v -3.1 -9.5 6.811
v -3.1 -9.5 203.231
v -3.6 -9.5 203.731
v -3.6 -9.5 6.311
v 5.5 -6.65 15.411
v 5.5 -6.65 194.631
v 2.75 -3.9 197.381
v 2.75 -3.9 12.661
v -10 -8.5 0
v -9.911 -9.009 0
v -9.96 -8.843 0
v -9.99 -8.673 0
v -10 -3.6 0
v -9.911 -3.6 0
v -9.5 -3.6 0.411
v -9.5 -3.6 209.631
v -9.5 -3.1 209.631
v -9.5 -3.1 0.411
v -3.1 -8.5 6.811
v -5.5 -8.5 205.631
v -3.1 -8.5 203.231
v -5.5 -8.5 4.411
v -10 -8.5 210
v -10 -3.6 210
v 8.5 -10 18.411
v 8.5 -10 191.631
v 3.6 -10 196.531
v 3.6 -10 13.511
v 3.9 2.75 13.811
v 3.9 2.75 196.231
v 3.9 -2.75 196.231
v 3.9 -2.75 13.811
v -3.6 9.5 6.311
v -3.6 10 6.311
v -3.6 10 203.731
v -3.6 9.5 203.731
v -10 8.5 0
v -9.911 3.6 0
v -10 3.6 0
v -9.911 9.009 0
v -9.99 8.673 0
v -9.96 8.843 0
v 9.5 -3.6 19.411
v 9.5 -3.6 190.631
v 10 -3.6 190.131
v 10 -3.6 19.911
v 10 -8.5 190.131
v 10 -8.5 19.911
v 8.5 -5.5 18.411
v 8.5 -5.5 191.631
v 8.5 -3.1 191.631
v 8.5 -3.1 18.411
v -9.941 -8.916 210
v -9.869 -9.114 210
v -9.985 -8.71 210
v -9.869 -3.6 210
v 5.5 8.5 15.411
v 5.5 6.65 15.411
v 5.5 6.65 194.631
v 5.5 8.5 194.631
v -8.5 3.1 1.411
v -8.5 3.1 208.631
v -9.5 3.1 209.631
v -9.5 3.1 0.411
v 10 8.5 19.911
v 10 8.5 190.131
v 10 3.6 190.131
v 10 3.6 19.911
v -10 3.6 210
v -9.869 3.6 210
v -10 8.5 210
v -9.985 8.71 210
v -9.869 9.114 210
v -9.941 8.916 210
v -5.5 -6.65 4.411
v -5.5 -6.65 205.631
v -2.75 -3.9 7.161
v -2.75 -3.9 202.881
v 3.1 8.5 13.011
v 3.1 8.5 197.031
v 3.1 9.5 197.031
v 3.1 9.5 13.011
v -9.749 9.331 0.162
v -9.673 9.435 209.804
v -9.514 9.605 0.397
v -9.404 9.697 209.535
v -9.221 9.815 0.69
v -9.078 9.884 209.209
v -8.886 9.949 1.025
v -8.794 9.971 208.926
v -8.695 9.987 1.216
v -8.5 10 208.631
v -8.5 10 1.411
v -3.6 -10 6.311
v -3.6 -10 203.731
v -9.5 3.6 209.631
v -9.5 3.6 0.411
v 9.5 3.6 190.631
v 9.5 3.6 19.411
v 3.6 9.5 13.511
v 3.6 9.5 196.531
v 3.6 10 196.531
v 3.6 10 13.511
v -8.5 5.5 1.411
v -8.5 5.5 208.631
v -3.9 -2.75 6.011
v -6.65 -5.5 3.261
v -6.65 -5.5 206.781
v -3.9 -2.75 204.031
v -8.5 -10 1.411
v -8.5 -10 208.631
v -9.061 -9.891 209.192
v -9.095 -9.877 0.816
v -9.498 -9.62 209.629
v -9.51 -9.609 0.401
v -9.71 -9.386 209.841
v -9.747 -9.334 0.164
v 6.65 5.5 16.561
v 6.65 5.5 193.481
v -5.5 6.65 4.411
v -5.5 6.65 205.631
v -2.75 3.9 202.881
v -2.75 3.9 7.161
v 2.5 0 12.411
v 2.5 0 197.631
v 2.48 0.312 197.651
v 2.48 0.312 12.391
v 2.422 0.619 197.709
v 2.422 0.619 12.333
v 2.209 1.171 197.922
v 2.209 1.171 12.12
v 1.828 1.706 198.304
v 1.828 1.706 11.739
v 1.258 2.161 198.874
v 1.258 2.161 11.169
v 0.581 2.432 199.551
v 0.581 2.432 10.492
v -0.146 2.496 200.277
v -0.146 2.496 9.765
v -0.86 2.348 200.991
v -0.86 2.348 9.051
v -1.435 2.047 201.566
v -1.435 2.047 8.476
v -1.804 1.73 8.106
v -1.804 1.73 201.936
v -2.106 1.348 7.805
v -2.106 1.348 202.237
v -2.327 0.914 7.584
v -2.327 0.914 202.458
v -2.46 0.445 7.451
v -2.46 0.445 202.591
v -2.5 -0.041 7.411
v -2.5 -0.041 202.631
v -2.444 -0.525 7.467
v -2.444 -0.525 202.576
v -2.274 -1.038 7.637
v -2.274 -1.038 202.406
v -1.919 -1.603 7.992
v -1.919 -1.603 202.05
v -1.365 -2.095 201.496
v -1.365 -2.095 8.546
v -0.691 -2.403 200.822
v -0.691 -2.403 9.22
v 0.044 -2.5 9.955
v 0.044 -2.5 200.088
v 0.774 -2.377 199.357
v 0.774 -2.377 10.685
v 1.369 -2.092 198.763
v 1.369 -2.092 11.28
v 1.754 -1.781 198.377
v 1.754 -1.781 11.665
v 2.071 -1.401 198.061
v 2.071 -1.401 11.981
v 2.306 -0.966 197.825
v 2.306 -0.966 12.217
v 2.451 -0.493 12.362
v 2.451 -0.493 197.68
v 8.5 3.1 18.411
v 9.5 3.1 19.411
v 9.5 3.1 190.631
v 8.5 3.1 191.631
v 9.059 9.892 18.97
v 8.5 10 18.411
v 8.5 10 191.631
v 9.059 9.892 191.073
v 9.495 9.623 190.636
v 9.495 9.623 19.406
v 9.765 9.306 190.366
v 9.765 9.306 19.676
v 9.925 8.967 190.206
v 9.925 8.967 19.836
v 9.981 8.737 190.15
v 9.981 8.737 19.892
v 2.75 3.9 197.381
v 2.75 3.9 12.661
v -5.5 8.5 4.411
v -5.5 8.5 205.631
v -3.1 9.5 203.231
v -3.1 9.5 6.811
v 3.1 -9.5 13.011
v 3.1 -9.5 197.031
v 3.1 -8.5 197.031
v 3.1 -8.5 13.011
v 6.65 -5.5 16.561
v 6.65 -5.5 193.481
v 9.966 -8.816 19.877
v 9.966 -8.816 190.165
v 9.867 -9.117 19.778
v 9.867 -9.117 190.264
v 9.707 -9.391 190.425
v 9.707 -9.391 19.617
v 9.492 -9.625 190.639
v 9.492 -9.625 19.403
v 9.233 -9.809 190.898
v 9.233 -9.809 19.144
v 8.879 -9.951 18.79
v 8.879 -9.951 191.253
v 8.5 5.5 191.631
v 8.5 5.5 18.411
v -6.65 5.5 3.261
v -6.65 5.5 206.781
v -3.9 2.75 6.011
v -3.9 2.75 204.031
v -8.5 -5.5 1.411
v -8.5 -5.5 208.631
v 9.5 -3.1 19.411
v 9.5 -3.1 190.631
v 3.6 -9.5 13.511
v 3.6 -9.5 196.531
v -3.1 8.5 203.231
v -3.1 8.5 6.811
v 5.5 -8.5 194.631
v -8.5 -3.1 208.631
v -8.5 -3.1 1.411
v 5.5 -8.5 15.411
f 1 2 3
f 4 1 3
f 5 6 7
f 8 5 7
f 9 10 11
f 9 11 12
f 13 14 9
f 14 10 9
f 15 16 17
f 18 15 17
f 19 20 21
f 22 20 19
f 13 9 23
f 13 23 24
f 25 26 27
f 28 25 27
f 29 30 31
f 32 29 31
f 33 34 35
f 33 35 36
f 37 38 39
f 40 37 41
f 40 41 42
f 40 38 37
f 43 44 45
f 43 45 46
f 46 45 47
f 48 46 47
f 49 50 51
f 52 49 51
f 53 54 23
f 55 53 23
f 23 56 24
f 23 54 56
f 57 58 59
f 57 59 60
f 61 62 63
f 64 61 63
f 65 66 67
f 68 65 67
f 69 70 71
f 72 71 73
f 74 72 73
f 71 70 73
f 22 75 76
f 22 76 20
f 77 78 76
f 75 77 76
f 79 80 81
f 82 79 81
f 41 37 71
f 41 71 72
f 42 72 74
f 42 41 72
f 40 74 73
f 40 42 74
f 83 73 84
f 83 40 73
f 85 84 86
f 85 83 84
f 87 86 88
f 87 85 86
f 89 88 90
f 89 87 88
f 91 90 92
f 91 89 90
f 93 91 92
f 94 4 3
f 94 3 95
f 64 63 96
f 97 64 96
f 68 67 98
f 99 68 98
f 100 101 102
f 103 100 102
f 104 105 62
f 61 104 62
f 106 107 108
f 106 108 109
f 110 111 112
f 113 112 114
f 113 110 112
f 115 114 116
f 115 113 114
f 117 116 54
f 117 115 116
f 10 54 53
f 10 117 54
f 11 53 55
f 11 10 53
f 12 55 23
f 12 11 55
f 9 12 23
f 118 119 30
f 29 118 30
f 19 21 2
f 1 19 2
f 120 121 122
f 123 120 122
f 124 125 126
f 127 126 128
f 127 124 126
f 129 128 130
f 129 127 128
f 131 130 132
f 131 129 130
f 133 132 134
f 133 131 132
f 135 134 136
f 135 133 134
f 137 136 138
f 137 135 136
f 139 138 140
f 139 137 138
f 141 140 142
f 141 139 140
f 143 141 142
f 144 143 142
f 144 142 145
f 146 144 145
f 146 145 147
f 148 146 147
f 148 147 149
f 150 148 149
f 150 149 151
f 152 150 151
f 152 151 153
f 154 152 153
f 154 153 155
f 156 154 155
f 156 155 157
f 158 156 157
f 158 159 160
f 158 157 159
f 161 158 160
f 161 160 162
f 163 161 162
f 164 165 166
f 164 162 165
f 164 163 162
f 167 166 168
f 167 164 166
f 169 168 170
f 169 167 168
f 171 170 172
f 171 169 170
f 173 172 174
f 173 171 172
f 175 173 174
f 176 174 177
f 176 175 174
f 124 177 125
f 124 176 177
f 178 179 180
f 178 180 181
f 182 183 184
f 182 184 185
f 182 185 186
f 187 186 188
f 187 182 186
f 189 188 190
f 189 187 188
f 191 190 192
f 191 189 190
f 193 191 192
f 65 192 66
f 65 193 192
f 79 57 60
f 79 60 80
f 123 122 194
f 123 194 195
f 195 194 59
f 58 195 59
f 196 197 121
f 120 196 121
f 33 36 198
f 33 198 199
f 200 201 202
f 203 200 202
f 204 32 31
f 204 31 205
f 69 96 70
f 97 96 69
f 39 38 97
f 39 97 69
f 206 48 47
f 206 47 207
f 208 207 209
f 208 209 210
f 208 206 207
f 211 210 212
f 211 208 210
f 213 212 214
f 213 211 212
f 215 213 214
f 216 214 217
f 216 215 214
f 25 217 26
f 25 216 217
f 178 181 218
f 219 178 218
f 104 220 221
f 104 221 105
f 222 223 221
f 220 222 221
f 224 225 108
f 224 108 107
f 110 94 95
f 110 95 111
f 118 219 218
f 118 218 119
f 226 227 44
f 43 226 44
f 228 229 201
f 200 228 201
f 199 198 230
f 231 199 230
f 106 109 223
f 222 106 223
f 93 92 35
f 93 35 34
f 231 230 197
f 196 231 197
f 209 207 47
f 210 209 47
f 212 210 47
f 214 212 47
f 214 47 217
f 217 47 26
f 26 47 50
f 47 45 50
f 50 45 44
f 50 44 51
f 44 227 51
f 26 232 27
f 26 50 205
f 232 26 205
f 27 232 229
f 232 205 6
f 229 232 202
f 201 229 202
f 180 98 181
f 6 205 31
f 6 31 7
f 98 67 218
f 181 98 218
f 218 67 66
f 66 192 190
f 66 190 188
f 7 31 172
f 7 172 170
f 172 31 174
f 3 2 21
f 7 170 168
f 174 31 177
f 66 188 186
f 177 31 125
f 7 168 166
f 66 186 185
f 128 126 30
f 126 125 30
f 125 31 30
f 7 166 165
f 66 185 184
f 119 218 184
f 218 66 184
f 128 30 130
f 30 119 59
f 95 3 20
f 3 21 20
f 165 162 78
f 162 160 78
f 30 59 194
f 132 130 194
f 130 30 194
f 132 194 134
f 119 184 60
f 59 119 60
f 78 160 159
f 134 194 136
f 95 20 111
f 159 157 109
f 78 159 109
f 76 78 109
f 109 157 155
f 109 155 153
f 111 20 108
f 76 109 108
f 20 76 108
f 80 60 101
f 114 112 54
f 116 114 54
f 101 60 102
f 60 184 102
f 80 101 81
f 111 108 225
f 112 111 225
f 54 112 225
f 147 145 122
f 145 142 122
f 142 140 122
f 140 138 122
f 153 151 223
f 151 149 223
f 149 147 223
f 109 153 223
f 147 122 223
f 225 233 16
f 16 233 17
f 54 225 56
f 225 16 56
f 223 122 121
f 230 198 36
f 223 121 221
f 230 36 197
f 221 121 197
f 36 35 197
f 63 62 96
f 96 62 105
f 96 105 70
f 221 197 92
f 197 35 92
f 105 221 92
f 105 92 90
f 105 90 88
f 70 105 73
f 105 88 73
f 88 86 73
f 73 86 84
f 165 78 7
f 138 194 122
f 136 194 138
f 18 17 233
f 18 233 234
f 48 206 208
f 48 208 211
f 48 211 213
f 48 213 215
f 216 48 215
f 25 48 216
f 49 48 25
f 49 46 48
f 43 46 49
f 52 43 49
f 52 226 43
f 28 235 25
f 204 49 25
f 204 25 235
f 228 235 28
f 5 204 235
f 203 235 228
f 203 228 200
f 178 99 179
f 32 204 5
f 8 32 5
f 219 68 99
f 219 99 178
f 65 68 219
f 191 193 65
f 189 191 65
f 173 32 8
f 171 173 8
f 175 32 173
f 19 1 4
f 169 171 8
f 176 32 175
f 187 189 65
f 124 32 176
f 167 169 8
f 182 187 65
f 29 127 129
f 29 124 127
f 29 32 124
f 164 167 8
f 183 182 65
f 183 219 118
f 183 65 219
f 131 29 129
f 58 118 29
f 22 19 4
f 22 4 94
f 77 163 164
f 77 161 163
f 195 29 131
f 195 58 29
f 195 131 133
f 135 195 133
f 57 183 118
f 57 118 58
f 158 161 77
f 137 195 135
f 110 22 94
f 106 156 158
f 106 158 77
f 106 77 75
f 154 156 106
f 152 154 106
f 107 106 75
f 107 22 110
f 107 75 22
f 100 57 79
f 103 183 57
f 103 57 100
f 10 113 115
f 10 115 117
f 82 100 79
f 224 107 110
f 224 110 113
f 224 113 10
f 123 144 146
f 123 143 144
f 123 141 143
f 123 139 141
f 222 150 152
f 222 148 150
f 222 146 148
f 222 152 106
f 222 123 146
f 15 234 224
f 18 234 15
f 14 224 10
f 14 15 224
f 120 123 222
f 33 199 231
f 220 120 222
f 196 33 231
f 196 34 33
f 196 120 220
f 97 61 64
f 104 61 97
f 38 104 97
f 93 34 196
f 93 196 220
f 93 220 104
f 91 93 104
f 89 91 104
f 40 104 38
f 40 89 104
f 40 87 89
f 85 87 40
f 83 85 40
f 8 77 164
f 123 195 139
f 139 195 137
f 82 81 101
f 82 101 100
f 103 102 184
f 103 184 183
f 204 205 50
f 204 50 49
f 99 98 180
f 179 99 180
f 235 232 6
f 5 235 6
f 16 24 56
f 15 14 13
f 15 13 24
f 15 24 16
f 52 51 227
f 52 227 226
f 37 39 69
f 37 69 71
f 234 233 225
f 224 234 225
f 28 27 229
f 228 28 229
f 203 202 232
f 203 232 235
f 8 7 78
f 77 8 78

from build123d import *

# Parameters (mm, degrees)
SKETCH1_R           = 2.5
EXTRUDE_1_DEPTH     = 210
CUT_EXTRUDE_1_DEPTH = 212.187120819


with BuildPart() as part:
    # Sketch1 → 凸台-拉伸1 (new body)
    with BuildSketch(Plane.XY):
        with BuildLine():
            Line((-3.6, 10), (-3.6, 9.5))
            Line((-3.6, 9.5), (-3.1, 9.5))
            Line((-3.1, 9.5), (-3.1, 8.5))
            Line((-3.1, 8.5), (-5.5, 8.5))
            Line((-5.5, 8.5), (-5.5, 6.65))
            Line((-5.5, 6.65), (-2.75, 3.9))
            Line((-2.75, 3.9), (2.75, 3.9))
            Line((2.75, 3.9), (5.5, 6.65))
            Line((5.5, 6.65), (5.5, 8.5))
            Line((5.5, 8.5), (3.1, 8.5))
            Line((3.1, 8.5), (3.1, 9.5))
            Line((3.1, 9.5), (3.6, 9.5))
            Line((3.6, 9.5), (3.6, 10))
            Line((3.6, 10), (8.5, 10))
            ThreePointArc((8.5, 10), (9.560660172, 9.560660172), (10, 8.5))
            Line((10, 8.5), (10, 3.6))
            Line((10, 3.6), (9.5, 3.6))
            Line((9.5, 3.6), (9.5, 3.1))
            Line((9.5, 3.1), (8.5, 3.1))
            Line((8.5, 3.1), (8.5, 5.5))
            Line((8.5, 5.5), (6.65, 5.5))
            Line((6.65, 5.5), (3.9, 2.75))
            Line((3.9, 2.75), (3.9, -2.75))
            Line((3.9, -2.75), (6.65, -5.5))
            Line((6.65, -5.5), (8.5, -5.5))
            Line((8.5, -5.5), (8.5, -3.1))
            Line((8.5, -3.1), (9.5, -3.1))
            Line((9.5, -3.1), (9.5, -3.6))
            Line((9.5, -3.6), (10, -3.6))
            Line((10, -3.6), (10, -8.5))
            ThreePointArc((10, -8.5), (9.560660172, -9.560660172), (8.5, -10))
            Line((8.5, -10), (3.6, -10))
            Line((3.6, -10), (3.6, -9.5))
            Line((3.6, -9.5), (3.1, -9.5))
            Line((3.1, -9.5), (3.1, -8.5))
            Line((3.1, -8.5), (5.5, -8.5))
            Line((5.5, -8.5), (5.5, -6.65))
            Line((5.5, -6.65), (2.75, -3.9))
            Line((2.75, -3.9), (-2.75, -3.9))
            Line((-2.75, -3.9), (-5.5, -6.65))
            Line((-5.5, -6.65), (-5.5, -8.5))
            Line((-5.5, -8.5), (-3.1, -8.5))
            Line((-3.1, -8.5), (-3.1, -9.5))
            Line((-3.1, -9.5), (-3.6, -9.5))
            Line((-3.6, -9.5), (-3.6, -10))
            Line((-3.6, -10), (-8.5, -10))
            ThreePointArc((-8.5, -10), (-9.560660172, -9.560660172), (-10, -8.5))
            Line((-10, -8.5), (-10, -3.6))
            Line((-10, -3.6), (-9.5, -3.6))
            Line((-9.5, -3.6), (-9.5, -3.1))
            Line((-9.5, -3.1), (-8.5, -3.1))
            Line((-8.5, -3.1), (-8.5, -5.5))
            Line((-8.5, -5.5), (-6.65, -5.5))
            Line((-6.65, -5.5), (-3.9, -2.75))
            Line((-3.9, -2.75), (-3.9, 2.75))
            Line((-3.9, 2.75), (-6.65, 5.5))
            Line((-6.65, 5.5), (-8.5, 5.5))
            Line((-8.5, 5.5), (-8.5, 3.1))
            Line((-8.5, 3.1), (-9.5, 3.1))
            Line((-9.5, 3.1), (-9.5, 3.6))
            Line((-9.5, 3.6), (-10, 3.6))
            Line((-10, 3.6), (-10, 8.5))
            ThreePointArc((-10, 8.5), (-9.560660172, 9.560660172), (-8.5, 10))
            Line((-8.5, 10), (-3.6, 10))
        make_face()
        Circle(SKETCH1_R, mode=Mode.SUBTRACT)
    extrude(amount=EXTRUDE_1_DEPTH)

    # 草图1 → 切除-拉伸1 (cut, through all)
    with BuildSketch(Plane(origin=(0, 10, 0), x_dir=(1, 0, 0), z_dir=(0, 1, 0))):
        Polygon((-9.86868981, -210), (10.13131019, -210), (10.13131019, -190), align=None)
        Polygon((-9.910928713, 0), (10.089071287, 0), (10.089071287, -20), align=None)
    extrude(amount=-CUT_EXTRUDE_1_DEPTH, mode=Mode.SUBTRACT)


solid = part.part
